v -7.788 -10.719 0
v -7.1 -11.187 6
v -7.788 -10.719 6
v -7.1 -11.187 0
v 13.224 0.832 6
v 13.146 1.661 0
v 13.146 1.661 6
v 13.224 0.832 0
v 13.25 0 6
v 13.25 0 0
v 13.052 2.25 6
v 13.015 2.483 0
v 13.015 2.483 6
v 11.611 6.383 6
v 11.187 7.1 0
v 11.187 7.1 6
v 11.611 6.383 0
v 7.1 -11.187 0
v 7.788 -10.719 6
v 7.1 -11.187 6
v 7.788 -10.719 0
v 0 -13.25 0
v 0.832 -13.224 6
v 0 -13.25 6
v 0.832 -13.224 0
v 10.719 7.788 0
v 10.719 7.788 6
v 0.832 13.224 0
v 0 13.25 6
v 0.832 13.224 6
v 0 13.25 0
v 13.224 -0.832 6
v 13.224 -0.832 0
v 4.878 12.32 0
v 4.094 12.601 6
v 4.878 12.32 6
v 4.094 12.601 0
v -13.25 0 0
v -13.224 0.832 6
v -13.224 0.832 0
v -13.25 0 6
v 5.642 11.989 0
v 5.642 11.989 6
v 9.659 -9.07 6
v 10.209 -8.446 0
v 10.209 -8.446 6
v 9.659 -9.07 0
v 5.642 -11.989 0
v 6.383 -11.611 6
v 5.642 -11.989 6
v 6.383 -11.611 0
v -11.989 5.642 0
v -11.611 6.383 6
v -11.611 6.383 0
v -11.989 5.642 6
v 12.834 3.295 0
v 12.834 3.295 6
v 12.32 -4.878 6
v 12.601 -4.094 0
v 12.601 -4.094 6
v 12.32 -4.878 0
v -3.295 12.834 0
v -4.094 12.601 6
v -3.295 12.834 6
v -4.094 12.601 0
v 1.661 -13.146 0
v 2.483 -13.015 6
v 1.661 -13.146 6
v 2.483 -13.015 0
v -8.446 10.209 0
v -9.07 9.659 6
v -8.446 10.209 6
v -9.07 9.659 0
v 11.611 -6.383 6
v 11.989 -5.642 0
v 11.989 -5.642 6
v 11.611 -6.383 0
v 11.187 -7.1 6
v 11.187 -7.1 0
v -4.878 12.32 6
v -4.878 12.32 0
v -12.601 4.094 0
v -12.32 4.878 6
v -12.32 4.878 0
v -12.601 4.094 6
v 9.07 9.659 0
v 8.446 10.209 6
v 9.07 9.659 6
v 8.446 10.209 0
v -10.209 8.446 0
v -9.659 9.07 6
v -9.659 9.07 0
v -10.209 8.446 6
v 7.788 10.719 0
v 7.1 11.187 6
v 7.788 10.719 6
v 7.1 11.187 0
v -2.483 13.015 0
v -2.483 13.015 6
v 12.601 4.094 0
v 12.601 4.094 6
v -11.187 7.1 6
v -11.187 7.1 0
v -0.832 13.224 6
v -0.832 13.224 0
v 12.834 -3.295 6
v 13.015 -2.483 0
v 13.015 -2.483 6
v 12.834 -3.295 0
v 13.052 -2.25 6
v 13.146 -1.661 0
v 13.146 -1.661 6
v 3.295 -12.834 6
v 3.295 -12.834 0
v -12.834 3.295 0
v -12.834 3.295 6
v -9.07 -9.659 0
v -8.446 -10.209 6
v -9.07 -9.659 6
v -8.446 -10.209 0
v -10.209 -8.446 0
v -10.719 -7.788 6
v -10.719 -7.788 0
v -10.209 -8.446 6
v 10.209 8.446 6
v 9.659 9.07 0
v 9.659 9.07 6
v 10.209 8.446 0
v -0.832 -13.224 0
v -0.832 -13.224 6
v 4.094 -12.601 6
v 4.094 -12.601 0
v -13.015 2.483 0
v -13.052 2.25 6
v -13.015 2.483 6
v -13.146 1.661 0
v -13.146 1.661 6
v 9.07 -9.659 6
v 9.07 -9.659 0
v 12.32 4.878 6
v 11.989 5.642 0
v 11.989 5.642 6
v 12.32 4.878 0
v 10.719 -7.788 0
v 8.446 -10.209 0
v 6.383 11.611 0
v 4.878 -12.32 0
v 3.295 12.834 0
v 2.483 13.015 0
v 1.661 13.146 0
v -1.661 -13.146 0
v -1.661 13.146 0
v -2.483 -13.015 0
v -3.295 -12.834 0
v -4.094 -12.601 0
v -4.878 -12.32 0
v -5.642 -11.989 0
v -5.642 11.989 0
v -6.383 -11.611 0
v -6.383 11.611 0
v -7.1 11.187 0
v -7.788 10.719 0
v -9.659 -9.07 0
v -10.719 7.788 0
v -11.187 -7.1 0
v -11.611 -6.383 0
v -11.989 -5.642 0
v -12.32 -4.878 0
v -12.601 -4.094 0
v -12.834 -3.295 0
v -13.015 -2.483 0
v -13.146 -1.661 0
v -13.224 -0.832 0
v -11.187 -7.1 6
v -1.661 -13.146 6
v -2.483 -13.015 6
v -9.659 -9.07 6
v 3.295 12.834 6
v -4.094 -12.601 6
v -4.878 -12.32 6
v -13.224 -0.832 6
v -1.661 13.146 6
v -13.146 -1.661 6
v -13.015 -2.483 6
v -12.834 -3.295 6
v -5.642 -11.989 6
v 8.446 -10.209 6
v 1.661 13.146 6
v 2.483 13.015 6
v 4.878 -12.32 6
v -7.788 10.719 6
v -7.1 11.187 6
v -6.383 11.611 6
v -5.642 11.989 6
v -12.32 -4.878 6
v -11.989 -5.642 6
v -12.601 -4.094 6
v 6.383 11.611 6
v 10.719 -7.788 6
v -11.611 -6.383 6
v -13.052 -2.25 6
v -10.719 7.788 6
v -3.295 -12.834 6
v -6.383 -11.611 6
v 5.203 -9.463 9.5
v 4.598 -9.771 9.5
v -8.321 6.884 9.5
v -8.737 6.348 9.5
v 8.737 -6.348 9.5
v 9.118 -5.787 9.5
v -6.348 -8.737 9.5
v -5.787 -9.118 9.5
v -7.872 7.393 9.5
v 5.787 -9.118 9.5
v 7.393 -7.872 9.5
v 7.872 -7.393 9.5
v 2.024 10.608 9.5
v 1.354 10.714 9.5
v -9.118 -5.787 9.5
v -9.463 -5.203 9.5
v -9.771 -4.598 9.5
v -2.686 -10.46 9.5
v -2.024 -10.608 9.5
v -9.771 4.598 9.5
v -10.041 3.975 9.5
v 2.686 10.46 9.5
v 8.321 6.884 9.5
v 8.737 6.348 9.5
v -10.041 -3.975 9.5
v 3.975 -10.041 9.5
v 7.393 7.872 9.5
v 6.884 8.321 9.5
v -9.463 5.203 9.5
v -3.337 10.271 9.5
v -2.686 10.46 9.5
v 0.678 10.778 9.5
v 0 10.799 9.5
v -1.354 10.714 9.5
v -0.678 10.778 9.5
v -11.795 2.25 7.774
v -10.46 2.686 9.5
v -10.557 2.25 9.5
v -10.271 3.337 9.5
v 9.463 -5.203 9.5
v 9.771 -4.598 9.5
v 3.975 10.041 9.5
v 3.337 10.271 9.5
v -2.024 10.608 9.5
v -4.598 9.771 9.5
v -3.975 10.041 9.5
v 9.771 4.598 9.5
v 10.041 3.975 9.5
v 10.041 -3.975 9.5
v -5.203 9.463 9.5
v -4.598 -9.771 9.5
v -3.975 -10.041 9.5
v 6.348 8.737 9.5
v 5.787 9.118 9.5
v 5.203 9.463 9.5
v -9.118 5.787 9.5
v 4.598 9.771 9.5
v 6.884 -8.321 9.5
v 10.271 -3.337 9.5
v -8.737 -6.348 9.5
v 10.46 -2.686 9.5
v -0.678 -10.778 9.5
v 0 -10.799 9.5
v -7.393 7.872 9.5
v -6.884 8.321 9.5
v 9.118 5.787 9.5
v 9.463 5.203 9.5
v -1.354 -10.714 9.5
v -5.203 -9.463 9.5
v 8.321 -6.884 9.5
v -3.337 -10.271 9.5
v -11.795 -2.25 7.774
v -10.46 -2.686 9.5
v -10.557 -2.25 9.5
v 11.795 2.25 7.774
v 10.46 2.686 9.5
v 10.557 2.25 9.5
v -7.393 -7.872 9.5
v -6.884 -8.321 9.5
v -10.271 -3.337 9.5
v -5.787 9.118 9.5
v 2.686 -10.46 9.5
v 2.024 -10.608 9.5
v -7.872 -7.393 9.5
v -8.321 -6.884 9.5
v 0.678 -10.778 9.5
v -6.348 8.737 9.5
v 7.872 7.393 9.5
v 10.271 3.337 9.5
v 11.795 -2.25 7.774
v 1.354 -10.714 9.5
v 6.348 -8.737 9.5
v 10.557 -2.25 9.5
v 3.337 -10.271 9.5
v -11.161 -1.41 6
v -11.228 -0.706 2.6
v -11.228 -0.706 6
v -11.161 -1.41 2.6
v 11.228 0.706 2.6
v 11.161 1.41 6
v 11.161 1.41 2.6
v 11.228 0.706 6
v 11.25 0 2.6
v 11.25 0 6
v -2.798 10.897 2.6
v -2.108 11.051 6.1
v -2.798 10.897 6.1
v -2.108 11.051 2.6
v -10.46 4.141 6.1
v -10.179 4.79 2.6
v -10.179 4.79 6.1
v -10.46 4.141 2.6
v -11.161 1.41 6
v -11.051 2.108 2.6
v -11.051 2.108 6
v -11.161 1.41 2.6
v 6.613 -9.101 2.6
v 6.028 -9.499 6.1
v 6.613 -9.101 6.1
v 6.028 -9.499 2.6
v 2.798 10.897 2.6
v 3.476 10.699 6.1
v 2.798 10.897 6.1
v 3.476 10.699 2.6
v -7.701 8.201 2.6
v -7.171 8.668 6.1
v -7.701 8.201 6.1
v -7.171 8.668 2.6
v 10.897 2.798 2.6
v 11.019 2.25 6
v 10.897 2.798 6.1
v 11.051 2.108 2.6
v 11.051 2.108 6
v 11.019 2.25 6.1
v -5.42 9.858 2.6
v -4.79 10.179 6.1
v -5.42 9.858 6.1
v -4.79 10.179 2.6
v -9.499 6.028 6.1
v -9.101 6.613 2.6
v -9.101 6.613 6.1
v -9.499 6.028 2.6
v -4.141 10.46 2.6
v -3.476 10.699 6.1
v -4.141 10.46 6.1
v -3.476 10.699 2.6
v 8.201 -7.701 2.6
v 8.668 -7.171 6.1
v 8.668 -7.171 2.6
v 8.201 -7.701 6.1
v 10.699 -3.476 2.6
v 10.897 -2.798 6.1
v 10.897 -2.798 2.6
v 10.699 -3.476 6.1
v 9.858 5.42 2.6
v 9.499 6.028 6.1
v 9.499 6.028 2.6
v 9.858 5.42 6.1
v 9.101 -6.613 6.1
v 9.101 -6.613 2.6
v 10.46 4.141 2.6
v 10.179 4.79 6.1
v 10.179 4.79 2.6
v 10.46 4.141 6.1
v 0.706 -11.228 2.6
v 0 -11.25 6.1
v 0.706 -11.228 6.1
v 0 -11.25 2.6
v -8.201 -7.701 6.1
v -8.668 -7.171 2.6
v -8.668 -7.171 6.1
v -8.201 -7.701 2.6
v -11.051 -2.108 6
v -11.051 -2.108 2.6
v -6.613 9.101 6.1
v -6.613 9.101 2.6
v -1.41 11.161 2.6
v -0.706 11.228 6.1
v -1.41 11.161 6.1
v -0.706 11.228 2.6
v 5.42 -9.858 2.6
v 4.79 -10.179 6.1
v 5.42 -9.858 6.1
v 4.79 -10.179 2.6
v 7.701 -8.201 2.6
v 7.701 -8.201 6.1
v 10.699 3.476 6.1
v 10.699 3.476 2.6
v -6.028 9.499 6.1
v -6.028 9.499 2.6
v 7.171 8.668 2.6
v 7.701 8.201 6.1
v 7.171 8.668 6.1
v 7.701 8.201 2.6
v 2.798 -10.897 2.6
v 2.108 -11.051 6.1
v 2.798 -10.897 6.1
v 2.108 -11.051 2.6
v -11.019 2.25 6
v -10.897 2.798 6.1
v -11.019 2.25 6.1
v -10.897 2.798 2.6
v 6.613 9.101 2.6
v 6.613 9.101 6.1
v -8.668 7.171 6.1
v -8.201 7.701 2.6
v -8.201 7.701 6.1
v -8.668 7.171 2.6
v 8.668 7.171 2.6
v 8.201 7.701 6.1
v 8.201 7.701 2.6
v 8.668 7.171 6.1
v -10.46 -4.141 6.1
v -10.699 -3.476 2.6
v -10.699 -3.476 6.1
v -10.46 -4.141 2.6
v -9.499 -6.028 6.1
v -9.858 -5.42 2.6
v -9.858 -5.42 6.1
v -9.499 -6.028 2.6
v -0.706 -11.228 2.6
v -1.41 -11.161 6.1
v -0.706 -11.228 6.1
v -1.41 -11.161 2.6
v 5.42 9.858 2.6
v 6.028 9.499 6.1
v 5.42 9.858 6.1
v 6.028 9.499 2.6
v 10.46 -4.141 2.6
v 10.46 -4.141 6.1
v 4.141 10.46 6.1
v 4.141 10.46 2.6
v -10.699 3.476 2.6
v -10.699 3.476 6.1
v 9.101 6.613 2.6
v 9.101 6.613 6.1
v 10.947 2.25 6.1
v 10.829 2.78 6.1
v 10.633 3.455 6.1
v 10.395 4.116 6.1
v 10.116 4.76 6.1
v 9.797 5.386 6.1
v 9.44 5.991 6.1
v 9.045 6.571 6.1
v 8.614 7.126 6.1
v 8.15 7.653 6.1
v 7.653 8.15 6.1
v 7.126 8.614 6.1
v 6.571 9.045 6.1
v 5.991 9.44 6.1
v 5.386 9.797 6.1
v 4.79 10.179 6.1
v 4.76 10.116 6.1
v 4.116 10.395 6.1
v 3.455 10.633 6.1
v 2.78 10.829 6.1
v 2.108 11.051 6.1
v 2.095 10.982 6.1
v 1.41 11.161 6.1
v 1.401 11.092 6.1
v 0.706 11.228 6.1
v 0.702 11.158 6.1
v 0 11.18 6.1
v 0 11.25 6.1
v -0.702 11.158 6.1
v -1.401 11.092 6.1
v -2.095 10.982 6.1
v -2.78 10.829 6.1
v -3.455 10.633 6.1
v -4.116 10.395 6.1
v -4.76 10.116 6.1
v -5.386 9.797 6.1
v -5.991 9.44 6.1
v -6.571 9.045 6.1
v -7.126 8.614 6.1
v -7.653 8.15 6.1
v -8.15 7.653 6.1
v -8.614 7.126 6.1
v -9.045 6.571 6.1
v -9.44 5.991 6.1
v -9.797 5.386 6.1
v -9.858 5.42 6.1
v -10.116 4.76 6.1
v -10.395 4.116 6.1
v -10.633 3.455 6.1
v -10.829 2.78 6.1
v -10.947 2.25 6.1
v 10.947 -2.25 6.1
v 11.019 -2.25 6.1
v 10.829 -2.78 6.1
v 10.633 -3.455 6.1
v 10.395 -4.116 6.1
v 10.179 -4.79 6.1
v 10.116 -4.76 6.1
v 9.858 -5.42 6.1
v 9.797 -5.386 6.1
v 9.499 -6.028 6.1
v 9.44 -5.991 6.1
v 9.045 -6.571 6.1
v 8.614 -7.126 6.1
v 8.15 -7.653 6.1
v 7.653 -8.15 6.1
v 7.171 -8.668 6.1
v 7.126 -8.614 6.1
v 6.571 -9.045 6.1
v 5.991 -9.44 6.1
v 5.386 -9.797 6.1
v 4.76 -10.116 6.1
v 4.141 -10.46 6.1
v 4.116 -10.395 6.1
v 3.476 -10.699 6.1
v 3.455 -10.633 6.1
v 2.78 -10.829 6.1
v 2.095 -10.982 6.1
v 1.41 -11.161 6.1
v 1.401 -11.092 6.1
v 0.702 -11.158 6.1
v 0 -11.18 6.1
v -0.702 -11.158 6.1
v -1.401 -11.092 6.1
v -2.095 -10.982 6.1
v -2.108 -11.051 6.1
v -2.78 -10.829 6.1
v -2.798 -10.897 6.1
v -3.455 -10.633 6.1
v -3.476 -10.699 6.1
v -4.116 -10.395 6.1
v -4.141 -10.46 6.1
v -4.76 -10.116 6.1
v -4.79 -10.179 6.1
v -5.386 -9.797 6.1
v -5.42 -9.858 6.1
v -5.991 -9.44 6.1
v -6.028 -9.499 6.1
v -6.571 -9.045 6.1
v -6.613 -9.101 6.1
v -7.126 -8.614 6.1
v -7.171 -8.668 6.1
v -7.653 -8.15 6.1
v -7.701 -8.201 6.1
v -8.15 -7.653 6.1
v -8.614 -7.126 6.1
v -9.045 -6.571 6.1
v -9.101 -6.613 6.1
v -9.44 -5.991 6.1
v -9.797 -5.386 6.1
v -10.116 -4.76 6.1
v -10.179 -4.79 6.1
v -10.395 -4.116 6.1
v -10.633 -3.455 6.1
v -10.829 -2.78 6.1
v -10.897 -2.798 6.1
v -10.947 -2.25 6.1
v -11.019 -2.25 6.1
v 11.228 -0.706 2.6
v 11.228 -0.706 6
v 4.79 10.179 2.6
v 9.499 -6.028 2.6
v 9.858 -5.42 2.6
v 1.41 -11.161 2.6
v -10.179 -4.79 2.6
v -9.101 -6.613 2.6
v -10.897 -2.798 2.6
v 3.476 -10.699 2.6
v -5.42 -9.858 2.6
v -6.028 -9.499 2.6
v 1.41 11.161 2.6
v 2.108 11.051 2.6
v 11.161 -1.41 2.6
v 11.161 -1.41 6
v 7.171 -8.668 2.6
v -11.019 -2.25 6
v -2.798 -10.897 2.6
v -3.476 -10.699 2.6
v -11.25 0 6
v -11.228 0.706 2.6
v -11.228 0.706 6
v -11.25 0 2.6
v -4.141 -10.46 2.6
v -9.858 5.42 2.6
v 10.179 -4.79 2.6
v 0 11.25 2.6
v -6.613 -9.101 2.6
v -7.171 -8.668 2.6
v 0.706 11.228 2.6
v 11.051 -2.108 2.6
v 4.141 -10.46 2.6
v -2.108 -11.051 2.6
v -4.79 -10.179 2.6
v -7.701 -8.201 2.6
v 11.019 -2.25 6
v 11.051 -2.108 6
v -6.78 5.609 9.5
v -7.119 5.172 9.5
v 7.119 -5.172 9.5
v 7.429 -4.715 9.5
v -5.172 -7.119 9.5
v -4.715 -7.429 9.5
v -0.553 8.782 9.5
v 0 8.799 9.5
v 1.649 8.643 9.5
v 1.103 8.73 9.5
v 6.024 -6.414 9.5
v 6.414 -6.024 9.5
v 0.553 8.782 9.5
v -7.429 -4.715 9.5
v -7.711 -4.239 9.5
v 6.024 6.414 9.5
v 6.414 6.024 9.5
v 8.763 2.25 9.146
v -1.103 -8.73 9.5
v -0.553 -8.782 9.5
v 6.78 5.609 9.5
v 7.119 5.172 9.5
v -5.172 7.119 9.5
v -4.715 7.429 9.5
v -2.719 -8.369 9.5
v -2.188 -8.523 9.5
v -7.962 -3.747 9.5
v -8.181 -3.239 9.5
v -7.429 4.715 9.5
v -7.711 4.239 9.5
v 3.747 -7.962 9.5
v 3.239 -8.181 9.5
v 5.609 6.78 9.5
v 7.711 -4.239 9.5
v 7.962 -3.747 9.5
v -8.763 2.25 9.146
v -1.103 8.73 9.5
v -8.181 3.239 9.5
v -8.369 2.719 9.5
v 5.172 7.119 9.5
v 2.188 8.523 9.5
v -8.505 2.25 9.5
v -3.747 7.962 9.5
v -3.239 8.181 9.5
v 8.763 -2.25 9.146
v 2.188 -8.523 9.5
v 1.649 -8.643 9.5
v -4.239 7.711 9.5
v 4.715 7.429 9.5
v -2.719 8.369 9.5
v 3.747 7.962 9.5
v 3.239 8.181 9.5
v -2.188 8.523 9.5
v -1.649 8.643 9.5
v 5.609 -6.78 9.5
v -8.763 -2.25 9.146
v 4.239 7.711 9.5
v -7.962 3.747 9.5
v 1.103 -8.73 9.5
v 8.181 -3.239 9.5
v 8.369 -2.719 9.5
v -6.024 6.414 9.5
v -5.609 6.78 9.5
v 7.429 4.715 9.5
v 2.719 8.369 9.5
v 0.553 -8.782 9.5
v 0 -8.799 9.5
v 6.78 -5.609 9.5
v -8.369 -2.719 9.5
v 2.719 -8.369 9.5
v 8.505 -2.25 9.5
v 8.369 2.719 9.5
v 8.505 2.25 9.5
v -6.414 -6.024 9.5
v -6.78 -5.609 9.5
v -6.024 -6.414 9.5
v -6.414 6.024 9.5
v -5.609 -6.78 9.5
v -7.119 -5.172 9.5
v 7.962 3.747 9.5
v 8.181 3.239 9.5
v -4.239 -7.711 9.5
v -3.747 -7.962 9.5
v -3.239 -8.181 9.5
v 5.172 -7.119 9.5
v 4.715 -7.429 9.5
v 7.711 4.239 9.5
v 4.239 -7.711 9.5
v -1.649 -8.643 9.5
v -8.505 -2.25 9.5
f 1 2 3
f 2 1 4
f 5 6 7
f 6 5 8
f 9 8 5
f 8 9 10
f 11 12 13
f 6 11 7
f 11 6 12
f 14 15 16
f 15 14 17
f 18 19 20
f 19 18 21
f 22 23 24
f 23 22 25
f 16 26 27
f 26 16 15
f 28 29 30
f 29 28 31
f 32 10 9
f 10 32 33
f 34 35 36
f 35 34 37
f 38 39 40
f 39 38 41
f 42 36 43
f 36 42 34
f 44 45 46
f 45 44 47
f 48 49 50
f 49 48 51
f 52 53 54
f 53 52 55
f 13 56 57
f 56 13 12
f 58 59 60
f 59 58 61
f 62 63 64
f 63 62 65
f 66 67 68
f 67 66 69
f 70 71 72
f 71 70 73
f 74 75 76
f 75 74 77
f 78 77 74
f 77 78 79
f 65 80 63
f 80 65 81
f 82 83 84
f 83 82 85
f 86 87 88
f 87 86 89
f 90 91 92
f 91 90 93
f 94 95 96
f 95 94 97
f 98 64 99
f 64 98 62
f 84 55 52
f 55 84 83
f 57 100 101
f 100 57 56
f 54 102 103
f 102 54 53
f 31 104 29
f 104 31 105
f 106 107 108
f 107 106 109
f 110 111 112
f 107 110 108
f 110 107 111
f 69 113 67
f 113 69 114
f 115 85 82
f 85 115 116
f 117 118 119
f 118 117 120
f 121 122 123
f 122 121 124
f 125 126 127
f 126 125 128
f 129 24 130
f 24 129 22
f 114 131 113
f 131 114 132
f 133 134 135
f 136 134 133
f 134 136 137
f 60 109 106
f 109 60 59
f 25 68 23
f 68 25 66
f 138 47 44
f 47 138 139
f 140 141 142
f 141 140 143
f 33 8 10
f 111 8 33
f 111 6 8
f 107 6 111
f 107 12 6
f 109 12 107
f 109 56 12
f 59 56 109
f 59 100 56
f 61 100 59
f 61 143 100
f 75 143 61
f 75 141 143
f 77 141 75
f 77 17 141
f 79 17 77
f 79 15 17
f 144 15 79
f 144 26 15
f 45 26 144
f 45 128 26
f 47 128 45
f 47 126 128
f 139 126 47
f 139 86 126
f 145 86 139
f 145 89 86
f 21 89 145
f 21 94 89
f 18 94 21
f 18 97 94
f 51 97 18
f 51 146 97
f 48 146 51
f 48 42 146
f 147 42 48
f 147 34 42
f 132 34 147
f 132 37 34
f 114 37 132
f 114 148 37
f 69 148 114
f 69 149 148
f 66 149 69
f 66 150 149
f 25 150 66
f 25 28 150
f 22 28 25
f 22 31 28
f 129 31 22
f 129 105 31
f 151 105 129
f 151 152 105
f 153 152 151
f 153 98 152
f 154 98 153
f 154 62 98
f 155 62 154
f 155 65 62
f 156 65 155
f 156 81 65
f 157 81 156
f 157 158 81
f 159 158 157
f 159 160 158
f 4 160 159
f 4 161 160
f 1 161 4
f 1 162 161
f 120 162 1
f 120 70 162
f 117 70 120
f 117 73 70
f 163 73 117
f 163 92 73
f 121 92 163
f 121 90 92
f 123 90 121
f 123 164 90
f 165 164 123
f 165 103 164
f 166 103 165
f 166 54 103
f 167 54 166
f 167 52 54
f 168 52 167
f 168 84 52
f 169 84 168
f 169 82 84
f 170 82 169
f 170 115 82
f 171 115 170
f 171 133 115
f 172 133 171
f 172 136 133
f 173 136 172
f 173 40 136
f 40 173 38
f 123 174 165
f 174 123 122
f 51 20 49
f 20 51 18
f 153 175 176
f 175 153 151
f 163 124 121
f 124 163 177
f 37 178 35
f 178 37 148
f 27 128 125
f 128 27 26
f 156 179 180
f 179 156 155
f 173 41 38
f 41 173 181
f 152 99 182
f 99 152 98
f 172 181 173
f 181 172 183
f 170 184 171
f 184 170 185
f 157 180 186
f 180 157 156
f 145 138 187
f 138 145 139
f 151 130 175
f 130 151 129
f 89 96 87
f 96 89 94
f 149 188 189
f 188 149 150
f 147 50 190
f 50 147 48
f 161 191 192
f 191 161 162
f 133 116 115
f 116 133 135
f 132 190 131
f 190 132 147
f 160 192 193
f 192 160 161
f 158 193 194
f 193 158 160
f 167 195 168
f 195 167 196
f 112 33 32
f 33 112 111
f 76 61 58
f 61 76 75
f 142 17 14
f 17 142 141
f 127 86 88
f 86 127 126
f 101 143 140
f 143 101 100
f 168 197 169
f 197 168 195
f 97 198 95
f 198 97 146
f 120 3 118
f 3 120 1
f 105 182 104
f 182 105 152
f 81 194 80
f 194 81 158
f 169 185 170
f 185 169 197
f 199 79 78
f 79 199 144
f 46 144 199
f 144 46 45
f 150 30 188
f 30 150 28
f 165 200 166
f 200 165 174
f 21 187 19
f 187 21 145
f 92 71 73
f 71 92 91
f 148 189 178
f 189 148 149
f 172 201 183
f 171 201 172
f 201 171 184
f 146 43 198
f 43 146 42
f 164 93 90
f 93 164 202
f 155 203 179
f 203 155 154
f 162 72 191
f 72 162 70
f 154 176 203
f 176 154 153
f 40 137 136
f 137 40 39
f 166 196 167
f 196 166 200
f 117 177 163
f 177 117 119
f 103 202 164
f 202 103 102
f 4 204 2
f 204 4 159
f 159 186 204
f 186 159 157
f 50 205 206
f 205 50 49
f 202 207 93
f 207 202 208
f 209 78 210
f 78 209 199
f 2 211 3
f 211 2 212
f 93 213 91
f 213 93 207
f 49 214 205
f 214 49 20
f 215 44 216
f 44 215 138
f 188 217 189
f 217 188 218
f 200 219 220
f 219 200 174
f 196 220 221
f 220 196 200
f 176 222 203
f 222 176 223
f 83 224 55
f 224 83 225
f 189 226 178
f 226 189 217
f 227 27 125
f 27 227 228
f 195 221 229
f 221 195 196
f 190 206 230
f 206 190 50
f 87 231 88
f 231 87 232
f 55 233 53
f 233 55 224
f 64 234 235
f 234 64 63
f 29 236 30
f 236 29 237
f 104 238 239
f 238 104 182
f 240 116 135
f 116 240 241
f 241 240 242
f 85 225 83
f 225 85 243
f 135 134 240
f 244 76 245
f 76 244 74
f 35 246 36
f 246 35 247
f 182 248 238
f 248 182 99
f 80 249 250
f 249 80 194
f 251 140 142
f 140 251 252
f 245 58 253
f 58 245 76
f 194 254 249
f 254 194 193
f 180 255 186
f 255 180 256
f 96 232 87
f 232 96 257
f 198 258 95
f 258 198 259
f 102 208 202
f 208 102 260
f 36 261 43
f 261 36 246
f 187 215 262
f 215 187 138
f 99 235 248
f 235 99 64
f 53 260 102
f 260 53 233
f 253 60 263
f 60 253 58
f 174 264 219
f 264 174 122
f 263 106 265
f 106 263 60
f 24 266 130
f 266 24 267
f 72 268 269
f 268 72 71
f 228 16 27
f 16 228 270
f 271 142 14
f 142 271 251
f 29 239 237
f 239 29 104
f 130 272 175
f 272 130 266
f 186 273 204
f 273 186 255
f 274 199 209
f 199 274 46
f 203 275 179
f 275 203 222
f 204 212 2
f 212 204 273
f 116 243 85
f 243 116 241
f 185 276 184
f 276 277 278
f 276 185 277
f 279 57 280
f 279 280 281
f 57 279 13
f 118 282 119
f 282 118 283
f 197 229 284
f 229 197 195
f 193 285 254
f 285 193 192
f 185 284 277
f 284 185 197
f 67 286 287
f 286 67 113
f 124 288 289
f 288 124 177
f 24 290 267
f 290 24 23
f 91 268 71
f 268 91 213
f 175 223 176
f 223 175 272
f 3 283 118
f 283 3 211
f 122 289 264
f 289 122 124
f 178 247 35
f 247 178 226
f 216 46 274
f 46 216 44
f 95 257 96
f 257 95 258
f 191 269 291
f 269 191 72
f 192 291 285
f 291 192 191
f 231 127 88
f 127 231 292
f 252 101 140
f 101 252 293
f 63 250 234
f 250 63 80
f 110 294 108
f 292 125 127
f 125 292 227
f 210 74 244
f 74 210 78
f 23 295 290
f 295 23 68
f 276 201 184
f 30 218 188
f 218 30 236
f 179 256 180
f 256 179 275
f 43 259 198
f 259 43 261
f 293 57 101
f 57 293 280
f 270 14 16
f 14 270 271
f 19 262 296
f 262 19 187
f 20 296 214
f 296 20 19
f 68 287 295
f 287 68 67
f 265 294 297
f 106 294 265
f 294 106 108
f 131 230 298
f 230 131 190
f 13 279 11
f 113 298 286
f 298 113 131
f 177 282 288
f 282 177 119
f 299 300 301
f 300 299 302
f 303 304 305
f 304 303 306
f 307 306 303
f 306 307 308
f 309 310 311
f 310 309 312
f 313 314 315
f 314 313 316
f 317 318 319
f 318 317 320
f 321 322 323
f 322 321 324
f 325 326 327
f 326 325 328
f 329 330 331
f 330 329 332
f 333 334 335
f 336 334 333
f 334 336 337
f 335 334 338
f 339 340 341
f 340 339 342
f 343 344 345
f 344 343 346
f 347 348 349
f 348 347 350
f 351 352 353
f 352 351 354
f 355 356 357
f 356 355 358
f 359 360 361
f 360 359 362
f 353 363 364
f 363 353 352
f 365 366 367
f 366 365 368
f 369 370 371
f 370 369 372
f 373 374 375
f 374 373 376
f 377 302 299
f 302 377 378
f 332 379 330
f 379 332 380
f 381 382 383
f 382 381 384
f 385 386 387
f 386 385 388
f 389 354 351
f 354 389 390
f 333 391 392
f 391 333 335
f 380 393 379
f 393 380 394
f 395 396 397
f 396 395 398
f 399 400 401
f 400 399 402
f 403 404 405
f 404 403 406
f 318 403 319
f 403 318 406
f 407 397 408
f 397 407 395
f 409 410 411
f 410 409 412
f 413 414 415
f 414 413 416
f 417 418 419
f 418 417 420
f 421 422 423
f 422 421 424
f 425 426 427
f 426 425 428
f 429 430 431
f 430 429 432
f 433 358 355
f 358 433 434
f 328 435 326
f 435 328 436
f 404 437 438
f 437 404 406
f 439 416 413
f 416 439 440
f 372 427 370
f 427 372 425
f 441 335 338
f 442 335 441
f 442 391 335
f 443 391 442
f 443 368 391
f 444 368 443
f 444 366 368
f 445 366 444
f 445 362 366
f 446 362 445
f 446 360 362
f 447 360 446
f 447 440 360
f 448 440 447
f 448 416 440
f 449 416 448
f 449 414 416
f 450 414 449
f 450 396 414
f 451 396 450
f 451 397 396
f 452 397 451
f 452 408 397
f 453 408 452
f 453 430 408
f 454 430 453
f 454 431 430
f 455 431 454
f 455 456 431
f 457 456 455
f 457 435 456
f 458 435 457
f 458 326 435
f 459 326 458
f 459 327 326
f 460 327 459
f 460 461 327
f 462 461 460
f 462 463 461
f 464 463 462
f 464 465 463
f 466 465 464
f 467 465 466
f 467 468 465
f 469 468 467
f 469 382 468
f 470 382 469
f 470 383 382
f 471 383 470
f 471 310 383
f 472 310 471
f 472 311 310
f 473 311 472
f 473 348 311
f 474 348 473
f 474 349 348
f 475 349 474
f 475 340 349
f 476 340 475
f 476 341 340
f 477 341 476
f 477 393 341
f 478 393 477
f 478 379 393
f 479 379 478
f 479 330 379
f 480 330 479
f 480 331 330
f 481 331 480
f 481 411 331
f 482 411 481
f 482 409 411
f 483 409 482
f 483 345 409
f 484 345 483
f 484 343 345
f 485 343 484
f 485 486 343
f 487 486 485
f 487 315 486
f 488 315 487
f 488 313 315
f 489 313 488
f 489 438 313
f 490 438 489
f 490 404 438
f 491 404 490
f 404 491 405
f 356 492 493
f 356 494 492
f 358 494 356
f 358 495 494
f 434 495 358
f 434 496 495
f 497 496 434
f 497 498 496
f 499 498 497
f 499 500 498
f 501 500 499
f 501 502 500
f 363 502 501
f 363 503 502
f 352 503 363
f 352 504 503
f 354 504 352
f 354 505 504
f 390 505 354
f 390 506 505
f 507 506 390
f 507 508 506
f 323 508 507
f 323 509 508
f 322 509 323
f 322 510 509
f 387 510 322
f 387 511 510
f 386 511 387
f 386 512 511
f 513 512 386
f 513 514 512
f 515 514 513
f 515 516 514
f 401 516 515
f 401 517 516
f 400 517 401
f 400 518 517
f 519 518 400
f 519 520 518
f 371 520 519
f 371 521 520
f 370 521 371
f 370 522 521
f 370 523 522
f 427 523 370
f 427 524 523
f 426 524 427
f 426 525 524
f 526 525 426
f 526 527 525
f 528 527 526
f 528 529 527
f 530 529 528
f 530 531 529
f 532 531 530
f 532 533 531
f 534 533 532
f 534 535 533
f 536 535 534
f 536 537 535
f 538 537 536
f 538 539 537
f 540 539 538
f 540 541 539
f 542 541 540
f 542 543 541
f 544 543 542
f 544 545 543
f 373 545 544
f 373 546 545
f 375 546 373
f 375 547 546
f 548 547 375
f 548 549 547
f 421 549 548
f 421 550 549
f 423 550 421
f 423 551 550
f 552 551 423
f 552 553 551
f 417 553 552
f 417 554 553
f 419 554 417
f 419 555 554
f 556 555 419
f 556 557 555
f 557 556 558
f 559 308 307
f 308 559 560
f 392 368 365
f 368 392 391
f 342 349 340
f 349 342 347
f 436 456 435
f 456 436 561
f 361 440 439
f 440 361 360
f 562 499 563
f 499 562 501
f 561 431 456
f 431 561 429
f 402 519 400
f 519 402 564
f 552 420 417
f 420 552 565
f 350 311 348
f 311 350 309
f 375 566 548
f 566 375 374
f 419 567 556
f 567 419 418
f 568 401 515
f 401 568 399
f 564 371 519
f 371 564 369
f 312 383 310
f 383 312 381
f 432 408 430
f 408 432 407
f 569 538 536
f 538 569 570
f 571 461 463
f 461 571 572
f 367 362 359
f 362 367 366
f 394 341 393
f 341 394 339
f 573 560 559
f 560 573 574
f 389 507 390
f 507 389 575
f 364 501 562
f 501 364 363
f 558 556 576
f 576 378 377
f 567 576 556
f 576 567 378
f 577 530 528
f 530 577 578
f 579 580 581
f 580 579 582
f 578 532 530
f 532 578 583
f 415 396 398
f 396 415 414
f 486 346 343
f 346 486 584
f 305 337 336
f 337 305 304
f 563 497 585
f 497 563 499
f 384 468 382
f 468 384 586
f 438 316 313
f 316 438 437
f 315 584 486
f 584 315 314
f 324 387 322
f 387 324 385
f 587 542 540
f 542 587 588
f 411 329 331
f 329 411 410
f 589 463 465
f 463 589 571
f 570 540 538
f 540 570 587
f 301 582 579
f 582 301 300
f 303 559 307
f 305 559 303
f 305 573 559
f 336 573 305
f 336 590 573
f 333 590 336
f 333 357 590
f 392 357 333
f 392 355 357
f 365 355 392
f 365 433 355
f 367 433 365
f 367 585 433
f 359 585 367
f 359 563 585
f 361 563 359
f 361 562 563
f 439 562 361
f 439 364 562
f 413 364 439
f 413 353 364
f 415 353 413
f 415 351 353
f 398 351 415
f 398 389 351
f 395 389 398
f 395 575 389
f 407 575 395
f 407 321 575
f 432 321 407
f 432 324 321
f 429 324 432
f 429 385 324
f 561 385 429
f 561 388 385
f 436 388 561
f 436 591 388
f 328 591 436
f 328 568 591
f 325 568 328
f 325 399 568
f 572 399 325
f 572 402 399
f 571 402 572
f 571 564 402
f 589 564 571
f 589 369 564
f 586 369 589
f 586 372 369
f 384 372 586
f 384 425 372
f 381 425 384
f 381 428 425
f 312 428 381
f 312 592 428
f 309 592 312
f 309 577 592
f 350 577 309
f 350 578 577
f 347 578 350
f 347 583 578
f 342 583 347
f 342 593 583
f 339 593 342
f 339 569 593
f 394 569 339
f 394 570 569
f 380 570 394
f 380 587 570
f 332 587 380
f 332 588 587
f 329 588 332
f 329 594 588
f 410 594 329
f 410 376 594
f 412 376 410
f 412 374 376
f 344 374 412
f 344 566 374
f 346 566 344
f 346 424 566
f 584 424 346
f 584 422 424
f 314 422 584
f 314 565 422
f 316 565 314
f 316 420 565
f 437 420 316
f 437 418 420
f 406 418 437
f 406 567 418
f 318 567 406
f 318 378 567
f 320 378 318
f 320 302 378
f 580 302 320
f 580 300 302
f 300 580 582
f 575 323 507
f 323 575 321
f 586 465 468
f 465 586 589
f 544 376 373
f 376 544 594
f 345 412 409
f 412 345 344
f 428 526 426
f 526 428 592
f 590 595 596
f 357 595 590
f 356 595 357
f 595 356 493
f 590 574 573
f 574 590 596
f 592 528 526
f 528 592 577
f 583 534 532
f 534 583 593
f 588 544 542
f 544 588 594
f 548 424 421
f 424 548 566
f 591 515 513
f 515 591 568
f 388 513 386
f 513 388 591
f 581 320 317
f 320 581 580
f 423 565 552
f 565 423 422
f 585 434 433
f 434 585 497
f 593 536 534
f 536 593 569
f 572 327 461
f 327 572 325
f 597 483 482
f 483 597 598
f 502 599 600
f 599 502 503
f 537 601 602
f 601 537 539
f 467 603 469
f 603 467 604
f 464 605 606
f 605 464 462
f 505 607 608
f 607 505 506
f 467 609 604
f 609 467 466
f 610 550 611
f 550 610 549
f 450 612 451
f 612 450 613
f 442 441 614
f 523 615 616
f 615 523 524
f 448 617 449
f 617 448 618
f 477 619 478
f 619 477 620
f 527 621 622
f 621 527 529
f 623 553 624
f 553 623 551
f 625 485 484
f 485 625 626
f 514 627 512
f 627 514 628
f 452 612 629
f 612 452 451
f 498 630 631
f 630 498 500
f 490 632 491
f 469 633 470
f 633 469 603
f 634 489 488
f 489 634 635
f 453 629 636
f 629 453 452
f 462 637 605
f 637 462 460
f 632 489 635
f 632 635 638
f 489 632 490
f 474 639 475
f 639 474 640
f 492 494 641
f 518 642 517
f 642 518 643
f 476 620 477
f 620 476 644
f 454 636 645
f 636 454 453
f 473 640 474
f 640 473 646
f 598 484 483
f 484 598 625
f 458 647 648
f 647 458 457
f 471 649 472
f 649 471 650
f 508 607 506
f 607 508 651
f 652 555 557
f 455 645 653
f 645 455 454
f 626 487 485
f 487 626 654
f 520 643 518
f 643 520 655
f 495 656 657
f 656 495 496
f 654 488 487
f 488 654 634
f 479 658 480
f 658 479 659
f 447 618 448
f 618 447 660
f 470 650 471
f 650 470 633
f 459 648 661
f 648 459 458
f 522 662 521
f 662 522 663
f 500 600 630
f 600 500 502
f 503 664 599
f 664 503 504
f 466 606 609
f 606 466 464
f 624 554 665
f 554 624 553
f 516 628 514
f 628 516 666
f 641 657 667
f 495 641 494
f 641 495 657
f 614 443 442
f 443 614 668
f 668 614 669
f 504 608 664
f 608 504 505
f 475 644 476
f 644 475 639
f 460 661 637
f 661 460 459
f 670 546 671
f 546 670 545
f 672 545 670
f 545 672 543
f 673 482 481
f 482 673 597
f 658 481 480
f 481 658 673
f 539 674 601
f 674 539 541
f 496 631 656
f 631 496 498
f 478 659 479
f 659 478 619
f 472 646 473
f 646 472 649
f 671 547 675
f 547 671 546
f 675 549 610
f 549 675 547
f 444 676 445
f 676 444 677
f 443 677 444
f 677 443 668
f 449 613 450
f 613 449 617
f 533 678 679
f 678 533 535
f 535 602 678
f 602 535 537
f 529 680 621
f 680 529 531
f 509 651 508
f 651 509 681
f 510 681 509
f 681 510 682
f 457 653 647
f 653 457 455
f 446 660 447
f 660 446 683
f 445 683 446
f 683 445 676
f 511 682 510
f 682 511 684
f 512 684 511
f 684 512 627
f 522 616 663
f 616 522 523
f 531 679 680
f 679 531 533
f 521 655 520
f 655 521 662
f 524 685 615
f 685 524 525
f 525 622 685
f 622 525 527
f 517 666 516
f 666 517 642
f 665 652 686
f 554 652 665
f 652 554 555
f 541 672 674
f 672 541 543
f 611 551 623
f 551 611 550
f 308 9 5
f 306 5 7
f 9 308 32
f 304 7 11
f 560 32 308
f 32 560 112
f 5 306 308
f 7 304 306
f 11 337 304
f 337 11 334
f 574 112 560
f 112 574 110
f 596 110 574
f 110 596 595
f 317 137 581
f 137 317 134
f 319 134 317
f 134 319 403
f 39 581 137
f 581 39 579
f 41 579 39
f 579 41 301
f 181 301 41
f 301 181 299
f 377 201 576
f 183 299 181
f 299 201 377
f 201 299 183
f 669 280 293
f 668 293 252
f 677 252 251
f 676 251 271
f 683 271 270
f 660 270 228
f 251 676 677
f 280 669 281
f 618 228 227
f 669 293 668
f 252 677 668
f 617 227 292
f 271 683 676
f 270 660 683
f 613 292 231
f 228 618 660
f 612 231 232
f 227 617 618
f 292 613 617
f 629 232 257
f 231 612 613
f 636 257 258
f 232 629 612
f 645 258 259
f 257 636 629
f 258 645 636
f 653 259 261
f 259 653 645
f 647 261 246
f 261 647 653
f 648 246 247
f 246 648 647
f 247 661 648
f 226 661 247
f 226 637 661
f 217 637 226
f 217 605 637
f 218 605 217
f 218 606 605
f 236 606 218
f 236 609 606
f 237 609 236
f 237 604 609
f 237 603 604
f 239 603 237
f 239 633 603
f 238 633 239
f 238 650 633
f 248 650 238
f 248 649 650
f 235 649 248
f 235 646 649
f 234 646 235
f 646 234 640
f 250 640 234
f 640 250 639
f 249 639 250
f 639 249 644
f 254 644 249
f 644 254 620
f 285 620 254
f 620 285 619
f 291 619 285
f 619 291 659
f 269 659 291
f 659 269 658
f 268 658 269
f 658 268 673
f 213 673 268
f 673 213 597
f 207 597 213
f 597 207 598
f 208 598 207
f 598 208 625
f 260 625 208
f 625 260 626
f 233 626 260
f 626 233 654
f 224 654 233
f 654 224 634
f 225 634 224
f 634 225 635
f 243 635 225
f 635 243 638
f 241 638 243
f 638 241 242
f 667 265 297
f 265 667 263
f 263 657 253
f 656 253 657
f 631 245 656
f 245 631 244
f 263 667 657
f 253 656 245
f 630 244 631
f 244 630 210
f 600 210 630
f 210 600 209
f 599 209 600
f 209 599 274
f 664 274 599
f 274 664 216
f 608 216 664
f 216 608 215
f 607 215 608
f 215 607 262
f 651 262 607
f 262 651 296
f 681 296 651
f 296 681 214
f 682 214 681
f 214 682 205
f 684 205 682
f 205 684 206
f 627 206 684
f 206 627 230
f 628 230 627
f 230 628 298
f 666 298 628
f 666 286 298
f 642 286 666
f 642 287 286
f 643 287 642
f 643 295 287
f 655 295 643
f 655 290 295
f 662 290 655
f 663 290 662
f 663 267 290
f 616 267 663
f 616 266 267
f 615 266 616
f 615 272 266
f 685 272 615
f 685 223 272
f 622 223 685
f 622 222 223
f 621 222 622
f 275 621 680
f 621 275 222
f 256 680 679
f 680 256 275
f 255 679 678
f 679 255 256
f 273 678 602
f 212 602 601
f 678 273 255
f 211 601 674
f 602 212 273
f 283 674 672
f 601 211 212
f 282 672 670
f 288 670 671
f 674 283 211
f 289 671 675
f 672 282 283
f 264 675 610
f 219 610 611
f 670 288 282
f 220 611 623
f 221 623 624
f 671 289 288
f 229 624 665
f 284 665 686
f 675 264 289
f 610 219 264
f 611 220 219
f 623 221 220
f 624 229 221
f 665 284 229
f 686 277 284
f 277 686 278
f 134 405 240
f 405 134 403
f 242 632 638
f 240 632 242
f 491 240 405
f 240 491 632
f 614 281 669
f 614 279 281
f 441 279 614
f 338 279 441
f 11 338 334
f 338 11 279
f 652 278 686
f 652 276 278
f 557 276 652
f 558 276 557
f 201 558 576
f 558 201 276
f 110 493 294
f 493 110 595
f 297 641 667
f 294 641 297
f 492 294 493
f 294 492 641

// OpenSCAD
$fn = 100;

//4 in c clamp
wallThickness = 2;
diameter = 16;
footHeight = 2.5;
footThickness = 2;
slotWidth = 2;
bootAngle = 45;//*/

//10 in c clamp
wallThickness = 2.5;
diameter = 30.5;
footHeight = 4;
footThickness = 2.5;
slotWidth = 5.5;
bootAngle = 45;//*/

//Bar Clamp
wallThickness = 2;
diameter = 22.5;
footHeight = 3.5;
footThickness = 2.5;
slotWidth = 4.5;
bootAngle = 55;//*/

//Math
totalHeight = footThickness + footHeight * 2;
radius = (diameter + (wallThickness*2))/2;
innerRadius = radius-wallThickness;

difference(){
  union(){
    cylinder(r=radius, h=footHeight+footThickness);
    translate([0,0,footHeight+footThickness])
      cylinder(h=tan(bootAngle)*radius,r1=radius,r2=0);
    }
  union(){
    translate([0,0,footThickness+.1])
      cylinder(r=innerRadius, h=footHeight);
    translate([0,0,footThickness + footHeight])
      cylinder(h=tan(bootAngle)*innerRadius,r1=innerRadius,r2=0);
    translate([-(radius),-(radius),totalHeight])
      cube([radius*2,radius*2,radius]);
    translate([-(radius),-(slotWidth/2),footHeight+footThickness])
      cube([radius*2,slotWidth,radius*2]);
    }
  }
